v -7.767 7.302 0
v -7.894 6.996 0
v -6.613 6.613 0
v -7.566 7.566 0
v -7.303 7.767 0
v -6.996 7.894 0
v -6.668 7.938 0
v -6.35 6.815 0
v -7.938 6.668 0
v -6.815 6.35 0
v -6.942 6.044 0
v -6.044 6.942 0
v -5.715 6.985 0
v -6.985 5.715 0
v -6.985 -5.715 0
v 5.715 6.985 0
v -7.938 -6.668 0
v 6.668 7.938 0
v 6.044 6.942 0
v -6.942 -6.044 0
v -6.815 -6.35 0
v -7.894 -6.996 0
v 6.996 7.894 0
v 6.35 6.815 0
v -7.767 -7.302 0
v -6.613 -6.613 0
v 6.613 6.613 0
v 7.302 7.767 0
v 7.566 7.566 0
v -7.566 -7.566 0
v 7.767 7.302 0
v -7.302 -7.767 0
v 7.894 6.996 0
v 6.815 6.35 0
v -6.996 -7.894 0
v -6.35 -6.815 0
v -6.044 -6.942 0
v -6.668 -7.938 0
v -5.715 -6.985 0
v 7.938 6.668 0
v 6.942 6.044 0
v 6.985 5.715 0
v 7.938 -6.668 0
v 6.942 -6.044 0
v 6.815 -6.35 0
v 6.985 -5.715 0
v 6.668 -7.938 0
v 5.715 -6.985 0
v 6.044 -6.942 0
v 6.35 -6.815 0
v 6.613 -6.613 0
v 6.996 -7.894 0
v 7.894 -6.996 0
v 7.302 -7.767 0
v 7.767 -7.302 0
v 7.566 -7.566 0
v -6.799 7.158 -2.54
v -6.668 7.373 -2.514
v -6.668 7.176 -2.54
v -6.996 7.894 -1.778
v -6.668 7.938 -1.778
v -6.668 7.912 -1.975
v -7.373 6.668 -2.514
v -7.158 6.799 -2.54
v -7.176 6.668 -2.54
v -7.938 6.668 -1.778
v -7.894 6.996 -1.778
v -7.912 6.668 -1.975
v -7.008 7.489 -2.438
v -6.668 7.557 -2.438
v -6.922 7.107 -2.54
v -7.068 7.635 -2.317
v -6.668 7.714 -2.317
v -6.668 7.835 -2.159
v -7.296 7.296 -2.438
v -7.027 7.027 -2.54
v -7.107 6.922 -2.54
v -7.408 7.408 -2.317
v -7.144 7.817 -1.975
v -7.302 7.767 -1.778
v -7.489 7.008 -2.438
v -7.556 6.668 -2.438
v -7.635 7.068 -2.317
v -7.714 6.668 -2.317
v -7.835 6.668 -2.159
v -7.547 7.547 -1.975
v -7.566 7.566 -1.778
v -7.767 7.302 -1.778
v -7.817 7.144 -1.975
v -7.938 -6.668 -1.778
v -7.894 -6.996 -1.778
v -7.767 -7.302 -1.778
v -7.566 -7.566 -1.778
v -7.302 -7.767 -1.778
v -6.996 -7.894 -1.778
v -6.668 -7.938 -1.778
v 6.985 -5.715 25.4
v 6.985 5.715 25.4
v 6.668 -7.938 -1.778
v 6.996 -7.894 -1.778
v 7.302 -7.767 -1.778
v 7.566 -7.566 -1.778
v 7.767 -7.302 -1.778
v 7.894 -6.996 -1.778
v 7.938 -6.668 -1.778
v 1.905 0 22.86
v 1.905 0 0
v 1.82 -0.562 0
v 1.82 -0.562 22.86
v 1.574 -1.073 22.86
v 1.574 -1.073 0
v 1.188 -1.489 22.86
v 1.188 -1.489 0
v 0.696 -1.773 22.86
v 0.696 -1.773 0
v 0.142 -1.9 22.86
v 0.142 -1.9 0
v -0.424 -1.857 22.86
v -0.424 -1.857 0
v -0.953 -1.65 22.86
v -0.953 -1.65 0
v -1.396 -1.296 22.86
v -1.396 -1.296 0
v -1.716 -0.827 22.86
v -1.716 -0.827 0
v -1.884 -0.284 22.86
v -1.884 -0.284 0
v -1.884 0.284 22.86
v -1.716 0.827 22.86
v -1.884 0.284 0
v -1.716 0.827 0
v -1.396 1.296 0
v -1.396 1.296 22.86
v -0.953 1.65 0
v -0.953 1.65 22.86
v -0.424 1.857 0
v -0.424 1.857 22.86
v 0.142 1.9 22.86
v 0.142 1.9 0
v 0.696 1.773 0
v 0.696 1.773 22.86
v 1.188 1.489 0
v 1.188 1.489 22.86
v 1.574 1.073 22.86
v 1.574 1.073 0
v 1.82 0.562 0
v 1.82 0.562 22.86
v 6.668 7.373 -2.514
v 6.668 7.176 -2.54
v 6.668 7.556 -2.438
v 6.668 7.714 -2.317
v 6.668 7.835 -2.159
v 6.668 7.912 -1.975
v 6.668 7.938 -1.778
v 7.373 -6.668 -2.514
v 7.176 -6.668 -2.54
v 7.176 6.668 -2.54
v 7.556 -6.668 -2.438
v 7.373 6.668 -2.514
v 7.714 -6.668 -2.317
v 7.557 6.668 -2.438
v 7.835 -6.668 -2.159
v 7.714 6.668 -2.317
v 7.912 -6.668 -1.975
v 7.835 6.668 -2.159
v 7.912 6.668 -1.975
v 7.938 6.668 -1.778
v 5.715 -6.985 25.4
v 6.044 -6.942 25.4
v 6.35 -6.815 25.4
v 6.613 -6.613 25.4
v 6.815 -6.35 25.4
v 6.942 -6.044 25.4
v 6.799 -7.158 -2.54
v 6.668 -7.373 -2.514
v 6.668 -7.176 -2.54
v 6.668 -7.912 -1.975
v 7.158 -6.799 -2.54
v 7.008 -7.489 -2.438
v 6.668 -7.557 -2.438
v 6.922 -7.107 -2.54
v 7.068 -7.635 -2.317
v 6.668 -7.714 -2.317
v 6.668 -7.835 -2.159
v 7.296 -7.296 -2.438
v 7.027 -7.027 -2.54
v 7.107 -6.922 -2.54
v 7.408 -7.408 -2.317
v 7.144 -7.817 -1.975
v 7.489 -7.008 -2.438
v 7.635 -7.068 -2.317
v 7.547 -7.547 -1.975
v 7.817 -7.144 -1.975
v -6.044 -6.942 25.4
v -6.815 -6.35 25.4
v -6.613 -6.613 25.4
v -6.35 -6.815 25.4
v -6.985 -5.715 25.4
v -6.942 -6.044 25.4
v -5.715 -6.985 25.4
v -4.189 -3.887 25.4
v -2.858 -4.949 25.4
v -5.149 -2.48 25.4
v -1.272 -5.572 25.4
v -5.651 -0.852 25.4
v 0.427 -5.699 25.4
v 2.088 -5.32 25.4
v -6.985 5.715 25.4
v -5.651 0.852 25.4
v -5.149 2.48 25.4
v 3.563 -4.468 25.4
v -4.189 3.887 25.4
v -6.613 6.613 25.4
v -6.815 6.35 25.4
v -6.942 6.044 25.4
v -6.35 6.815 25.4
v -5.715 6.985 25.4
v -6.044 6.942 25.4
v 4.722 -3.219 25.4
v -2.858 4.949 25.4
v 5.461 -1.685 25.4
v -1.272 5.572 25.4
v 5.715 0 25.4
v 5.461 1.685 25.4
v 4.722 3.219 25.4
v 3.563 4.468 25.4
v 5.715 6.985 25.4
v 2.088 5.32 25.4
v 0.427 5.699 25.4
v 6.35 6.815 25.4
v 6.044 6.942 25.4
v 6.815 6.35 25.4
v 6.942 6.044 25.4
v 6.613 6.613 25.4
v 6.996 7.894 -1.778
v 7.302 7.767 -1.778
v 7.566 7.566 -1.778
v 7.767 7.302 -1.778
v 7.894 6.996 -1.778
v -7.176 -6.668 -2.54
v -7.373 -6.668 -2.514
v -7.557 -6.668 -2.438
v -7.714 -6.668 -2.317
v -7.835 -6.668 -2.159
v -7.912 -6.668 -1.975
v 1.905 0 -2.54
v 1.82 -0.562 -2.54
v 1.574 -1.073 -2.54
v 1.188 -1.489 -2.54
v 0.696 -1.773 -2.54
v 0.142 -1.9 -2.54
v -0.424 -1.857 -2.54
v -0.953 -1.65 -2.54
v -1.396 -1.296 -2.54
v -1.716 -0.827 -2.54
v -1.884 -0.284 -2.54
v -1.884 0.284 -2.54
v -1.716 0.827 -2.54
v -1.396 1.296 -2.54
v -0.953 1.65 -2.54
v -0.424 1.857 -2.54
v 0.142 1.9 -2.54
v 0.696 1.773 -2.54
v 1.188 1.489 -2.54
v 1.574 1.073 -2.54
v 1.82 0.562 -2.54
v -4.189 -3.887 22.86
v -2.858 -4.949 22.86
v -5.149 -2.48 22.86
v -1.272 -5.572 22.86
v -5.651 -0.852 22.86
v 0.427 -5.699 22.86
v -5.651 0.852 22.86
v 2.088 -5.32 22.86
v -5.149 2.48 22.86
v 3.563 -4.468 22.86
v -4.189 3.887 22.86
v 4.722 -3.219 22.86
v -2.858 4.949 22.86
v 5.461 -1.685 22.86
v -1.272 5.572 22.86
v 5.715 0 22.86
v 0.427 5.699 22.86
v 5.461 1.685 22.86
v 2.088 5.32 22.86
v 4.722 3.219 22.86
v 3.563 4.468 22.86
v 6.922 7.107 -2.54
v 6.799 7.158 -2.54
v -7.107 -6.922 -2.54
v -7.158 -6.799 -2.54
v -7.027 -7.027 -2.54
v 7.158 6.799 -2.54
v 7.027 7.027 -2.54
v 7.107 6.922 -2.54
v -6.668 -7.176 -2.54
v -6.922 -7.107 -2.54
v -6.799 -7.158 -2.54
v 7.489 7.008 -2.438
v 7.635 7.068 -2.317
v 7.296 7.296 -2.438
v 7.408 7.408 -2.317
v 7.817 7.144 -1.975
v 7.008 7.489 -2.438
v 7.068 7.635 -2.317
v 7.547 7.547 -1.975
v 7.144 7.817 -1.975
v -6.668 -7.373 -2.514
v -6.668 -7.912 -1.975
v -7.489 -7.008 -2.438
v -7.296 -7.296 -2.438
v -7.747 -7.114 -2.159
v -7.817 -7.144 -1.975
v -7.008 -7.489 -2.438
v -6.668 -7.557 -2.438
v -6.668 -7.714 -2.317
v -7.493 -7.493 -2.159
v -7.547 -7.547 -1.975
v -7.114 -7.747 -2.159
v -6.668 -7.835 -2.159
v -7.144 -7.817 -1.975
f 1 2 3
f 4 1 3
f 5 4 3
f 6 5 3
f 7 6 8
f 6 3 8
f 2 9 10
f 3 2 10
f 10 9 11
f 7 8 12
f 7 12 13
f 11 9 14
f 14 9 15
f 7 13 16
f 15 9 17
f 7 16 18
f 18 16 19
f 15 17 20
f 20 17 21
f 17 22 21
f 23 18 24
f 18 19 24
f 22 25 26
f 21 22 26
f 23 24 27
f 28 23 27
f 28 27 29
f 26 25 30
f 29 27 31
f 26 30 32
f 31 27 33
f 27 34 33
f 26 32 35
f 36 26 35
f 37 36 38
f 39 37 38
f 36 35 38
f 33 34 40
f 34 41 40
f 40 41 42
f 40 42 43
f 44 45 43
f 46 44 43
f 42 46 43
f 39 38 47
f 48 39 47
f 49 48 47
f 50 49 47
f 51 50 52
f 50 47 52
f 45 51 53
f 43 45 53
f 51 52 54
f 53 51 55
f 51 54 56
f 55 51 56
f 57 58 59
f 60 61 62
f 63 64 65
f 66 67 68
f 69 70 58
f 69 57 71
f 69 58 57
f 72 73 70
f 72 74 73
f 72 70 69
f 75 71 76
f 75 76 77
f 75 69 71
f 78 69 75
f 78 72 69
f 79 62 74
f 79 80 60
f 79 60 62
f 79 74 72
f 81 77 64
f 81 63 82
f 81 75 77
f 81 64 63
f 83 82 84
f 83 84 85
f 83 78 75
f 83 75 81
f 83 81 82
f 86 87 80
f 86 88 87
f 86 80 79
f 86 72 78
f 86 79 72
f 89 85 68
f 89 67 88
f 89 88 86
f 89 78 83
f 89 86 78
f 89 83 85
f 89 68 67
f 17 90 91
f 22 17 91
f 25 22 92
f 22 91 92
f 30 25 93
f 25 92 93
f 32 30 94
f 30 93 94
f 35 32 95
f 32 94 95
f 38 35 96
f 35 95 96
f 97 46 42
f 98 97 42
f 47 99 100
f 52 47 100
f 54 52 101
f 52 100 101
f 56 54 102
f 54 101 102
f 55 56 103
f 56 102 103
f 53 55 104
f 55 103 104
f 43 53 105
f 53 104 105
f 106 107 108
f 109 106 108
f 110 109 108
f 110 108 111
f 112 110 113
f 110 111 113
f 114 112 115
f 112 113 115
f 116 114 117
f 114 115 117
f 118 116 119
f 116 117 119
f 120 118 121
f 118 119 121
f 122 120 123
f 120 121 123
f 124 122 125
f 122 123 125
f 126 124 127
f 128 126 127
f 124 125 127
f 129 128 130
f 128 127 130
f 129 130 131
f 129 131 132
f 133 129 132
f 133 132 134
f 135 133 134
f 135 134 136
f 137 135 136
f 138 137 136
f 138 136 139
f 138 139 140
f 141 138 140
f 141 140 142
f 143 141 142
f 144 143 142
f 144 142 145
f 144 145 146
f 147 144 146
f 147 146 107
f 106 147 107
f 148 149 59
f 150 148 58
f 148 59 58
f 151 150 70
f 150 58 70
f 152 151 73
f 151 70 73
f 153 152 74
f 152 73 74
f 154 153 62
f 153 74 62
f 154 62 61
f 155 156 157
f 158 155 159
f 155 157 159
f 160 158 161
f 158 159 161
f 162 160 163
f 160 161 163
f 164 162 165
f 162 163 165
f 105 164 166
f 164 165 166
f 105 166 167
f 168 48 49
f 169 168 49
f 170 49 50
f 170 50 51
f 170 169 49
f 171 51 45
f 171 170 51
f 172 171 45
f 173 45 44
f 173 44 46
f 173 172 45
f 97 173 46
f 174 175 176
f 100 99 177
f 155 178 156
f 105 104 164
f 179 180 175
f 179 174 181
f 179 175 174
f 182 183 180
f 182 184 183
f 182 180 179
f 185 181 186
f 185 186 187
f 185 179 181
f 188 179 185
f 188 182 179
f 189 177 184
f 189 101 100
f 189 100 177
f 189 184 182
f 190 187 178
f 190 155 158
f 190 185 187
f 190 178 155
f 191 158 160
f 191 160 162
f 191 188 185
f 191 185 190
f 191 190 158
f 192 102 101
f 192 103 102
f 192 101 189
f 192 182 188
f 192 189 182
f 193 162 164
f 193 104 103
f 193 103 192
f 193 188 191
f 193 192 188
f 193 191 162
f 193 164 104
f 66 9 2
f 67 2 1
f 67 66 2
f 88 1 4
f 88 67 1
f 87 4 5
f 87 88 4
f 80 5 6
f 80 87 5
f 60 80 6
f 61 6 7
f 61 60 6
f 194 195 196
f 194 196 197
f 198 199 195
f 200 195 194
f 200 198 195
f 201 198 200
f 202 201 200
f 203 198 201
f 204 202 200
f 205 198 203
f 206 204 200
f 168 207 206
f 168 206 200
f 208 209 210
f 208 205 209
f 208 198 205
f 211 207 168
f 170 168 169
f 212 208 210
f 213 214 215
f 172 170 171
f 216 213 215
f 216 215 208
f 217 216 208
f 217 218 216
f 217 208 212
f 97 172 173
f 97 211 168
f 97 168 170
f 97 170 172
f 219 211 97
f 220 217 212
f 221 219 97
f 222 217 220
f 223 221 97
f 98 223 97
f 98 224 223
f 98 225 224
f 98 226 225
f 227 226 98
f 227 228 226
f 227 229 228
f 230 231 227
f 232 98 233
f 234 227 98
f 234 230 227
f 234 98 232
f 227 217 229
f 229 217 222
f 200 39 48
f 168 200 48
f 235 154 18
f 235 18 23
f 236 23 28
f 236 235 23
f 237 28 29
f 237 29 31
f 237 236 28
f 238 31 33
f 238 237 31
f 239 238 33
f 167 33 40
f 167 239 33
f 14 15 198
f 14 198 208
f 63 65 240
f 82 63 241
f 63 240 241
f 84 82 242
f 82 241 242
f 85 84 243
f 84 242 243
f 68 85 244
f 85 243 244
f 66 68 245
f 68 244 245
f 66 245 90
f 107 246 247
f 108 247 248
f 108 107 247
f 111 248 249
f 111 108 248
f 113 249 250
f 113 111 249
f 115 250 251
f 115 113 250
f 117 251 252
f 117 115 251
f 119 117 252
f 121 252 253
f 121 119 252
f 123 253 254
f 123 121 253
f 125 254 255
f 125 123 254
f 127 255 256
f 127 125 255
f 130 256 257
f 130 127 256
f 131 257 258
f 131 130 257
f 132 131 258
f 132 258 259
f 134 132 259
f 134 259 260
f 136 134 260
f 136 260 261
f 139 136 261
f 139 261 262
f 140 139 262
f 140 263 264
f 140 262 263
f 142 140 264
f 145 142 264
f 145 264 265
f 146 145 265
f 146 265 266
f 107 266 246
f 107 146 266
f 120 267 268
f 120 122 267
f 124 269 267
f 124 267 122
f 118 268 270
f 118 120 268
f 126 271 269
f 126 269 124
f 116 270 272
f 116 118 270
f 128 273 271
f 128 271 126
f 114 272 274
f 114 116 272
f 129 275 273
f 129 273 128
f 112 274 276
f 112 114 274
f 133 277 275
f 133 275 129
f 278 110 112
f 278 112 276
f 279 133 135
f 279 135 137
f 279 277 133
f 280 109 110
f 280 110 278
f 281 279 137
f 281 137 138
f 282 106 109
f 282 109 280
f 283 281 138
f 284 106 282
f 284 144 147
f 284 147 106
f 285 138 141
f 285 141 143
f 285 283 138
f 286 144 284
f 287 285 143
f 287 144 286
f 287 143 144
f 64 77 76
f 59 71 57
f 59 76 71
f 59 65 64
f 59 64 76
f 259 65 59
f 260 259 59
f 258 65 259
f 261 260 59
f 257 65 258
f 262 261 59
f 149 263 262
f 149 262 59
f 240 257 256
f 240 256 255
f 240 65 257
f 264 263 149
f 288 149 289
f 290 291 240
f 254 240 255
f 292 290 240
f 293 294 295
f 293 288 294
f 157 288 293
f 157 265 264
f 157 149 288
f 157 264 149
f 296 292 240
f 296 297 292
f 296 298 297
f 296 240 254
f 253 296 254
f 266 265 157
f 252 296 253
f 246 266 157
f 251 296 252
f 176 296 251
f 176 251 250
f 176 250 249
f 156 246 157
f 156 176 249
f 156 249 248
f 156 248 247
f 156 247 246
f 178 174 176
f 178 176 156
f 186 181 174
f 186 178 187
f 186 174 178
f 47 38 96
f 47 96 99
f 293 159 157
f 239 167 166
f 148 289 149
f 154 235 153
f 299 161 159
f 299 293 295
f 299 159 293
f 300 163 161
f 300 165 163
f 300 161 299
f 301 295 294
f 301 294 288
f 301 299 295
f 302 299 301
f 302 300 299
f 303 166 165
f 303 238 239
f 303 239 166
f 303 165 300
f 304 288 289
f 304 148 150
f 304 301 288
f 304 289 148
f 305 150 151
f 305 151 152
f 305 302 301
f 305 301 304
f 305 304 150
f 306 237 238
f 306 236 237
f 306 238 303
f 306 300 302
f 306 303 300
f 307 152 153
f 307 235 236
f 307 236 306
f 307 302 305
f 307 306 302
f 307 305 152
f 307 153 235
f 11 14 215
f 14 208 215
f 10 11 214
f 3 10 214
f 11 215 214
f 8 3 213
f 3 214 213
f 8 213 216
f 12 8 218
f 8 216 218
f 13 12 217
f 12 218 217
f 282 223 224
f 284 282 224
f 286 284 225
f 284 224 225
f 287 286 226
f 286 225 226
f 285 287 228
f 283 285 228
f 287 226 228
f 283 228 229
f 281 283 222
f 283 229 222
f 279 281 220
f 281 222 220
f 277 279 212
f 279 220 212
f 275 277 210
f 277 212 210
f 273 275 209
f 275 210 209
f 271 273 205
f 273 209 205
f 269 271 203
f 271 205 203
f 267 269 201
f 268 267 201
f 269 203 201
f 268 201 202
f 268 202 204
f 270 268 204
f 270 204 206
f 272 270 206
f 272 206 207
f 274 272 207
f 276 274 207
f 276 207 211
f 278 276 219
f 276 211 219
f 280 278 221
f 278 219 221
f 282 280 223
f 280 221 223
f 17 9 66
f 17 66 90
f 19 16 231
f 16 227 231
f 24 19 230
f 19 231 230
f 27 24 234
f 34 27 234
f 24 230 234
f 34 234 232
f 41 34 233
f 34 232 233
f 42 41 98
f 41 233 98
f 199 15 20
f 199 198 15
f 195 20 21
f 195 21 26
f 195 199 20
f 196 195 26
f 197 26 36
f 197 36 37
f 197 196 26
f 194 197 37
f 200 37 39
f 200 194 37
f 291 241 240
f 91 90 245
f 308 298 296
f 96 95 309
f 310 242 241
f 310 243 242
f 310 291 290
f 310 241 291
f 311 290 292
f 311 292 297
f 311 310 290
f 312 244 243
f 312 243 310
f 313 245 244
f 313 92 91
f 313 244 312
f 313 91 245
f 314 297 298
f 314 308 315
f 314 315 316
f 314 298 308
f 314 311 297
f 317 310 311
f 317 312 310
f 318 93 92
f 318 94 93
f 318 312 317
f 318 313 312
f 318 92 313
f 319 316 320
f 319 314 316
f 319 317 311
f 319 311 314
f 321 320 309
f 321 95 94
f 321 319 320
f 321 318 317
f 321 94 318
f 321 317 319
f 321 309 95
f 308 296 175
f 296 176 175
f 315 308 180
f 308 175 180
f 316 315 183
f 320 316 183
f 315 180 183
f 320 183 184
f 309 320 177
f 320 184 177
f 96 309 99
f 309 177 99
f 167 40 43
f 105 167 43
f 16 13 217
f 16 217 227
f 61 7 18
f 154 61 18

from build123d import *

# Parameters (mm, degrees)
F0_W           = 13.97
F0_H           = 13.97
F1_DEPTH       = 25.4
F2_R           = 5.715
F3_DEPTH       = 2.54
F5_R           = 1.27
F6_W           = 15.875
F6_H           = 15.875
F7_DEPTH       = 2.54
F8_R           = 1.27
F9_R           = 0.762
F4_R           = 1.905
F10_DEPTH      = 25.401
F10_DEPTH_BACK = 2.541


with BuildPart() as f1:
    # F0 (on Top) → F1 (new body)
    with BuildSketch(Plane.XY):
        Rectangle(F0_W, F0_H)
    extrude(amount=F1_DEPTH)

    # F2 (on face) → F3 (cut)
    with BuildSketch(Plane.XY.offset(25.4)):
        Circle(F2_R)
    extrude(amount=-F3_DEPTH, mode=Mode.SUBTRACT)

    # F5
    f5_edges = [f1.edges().sort_by_distance(p)[0] for p in [
        (-6.985, 6.985, 12.7),
        (-6.985, -6.985, 12.7),
        (6.985, 6.985, 12.7),
        (6.985, -6.985, 12.7),
    ]]
    fillet(f5_edges, radius=F5_R)

    # F6 (on face) → F7 (join)
    with BuildSketch(Plane(origin=(0, 0, 0), x_dir=(1, 0, 0), z_dir=(0, 0, -1))):
        Rectangle(F6_W, F6_H)
    extrude(amount=F7_DEPTH)

    # F8
    f8_edges = [f1.edges().sort_by_distance(p)[0] for p in [
        (7.9375, -7.9375, -1.27),
        (-7.9375, -7.9375, -1.27),
        (-7.9375, 7.9375, -1.27),
        (7.9375, 7.9375, -1.27),
    ]]
    fillet(f8_edges, radius=F8_R)

    # F9
    f9_edges = [f1.edges().sort_by_distance(p)[0] for p in [
        (0, -7.9375, -2.54),
    ]]
    fillet(f9_edges, radius=F9_R)

    # F4 (on face) → F10 (cut, two sides)
    with BuildSketch(Plane(origin=(0, 0, 0), x_dir=(1, 0, 0), z_dir=(0, 0, -1))) as f10_sk:
        Circle(F4_R)
    extrude(amount=-F10_DEPTH, mode=Mode.SUBTRACT)
    extrude(f10_sk.sketch, amount=F10_DEPTH_BACK, mode=Mode.SUBTRACT)


solid = f1.part
